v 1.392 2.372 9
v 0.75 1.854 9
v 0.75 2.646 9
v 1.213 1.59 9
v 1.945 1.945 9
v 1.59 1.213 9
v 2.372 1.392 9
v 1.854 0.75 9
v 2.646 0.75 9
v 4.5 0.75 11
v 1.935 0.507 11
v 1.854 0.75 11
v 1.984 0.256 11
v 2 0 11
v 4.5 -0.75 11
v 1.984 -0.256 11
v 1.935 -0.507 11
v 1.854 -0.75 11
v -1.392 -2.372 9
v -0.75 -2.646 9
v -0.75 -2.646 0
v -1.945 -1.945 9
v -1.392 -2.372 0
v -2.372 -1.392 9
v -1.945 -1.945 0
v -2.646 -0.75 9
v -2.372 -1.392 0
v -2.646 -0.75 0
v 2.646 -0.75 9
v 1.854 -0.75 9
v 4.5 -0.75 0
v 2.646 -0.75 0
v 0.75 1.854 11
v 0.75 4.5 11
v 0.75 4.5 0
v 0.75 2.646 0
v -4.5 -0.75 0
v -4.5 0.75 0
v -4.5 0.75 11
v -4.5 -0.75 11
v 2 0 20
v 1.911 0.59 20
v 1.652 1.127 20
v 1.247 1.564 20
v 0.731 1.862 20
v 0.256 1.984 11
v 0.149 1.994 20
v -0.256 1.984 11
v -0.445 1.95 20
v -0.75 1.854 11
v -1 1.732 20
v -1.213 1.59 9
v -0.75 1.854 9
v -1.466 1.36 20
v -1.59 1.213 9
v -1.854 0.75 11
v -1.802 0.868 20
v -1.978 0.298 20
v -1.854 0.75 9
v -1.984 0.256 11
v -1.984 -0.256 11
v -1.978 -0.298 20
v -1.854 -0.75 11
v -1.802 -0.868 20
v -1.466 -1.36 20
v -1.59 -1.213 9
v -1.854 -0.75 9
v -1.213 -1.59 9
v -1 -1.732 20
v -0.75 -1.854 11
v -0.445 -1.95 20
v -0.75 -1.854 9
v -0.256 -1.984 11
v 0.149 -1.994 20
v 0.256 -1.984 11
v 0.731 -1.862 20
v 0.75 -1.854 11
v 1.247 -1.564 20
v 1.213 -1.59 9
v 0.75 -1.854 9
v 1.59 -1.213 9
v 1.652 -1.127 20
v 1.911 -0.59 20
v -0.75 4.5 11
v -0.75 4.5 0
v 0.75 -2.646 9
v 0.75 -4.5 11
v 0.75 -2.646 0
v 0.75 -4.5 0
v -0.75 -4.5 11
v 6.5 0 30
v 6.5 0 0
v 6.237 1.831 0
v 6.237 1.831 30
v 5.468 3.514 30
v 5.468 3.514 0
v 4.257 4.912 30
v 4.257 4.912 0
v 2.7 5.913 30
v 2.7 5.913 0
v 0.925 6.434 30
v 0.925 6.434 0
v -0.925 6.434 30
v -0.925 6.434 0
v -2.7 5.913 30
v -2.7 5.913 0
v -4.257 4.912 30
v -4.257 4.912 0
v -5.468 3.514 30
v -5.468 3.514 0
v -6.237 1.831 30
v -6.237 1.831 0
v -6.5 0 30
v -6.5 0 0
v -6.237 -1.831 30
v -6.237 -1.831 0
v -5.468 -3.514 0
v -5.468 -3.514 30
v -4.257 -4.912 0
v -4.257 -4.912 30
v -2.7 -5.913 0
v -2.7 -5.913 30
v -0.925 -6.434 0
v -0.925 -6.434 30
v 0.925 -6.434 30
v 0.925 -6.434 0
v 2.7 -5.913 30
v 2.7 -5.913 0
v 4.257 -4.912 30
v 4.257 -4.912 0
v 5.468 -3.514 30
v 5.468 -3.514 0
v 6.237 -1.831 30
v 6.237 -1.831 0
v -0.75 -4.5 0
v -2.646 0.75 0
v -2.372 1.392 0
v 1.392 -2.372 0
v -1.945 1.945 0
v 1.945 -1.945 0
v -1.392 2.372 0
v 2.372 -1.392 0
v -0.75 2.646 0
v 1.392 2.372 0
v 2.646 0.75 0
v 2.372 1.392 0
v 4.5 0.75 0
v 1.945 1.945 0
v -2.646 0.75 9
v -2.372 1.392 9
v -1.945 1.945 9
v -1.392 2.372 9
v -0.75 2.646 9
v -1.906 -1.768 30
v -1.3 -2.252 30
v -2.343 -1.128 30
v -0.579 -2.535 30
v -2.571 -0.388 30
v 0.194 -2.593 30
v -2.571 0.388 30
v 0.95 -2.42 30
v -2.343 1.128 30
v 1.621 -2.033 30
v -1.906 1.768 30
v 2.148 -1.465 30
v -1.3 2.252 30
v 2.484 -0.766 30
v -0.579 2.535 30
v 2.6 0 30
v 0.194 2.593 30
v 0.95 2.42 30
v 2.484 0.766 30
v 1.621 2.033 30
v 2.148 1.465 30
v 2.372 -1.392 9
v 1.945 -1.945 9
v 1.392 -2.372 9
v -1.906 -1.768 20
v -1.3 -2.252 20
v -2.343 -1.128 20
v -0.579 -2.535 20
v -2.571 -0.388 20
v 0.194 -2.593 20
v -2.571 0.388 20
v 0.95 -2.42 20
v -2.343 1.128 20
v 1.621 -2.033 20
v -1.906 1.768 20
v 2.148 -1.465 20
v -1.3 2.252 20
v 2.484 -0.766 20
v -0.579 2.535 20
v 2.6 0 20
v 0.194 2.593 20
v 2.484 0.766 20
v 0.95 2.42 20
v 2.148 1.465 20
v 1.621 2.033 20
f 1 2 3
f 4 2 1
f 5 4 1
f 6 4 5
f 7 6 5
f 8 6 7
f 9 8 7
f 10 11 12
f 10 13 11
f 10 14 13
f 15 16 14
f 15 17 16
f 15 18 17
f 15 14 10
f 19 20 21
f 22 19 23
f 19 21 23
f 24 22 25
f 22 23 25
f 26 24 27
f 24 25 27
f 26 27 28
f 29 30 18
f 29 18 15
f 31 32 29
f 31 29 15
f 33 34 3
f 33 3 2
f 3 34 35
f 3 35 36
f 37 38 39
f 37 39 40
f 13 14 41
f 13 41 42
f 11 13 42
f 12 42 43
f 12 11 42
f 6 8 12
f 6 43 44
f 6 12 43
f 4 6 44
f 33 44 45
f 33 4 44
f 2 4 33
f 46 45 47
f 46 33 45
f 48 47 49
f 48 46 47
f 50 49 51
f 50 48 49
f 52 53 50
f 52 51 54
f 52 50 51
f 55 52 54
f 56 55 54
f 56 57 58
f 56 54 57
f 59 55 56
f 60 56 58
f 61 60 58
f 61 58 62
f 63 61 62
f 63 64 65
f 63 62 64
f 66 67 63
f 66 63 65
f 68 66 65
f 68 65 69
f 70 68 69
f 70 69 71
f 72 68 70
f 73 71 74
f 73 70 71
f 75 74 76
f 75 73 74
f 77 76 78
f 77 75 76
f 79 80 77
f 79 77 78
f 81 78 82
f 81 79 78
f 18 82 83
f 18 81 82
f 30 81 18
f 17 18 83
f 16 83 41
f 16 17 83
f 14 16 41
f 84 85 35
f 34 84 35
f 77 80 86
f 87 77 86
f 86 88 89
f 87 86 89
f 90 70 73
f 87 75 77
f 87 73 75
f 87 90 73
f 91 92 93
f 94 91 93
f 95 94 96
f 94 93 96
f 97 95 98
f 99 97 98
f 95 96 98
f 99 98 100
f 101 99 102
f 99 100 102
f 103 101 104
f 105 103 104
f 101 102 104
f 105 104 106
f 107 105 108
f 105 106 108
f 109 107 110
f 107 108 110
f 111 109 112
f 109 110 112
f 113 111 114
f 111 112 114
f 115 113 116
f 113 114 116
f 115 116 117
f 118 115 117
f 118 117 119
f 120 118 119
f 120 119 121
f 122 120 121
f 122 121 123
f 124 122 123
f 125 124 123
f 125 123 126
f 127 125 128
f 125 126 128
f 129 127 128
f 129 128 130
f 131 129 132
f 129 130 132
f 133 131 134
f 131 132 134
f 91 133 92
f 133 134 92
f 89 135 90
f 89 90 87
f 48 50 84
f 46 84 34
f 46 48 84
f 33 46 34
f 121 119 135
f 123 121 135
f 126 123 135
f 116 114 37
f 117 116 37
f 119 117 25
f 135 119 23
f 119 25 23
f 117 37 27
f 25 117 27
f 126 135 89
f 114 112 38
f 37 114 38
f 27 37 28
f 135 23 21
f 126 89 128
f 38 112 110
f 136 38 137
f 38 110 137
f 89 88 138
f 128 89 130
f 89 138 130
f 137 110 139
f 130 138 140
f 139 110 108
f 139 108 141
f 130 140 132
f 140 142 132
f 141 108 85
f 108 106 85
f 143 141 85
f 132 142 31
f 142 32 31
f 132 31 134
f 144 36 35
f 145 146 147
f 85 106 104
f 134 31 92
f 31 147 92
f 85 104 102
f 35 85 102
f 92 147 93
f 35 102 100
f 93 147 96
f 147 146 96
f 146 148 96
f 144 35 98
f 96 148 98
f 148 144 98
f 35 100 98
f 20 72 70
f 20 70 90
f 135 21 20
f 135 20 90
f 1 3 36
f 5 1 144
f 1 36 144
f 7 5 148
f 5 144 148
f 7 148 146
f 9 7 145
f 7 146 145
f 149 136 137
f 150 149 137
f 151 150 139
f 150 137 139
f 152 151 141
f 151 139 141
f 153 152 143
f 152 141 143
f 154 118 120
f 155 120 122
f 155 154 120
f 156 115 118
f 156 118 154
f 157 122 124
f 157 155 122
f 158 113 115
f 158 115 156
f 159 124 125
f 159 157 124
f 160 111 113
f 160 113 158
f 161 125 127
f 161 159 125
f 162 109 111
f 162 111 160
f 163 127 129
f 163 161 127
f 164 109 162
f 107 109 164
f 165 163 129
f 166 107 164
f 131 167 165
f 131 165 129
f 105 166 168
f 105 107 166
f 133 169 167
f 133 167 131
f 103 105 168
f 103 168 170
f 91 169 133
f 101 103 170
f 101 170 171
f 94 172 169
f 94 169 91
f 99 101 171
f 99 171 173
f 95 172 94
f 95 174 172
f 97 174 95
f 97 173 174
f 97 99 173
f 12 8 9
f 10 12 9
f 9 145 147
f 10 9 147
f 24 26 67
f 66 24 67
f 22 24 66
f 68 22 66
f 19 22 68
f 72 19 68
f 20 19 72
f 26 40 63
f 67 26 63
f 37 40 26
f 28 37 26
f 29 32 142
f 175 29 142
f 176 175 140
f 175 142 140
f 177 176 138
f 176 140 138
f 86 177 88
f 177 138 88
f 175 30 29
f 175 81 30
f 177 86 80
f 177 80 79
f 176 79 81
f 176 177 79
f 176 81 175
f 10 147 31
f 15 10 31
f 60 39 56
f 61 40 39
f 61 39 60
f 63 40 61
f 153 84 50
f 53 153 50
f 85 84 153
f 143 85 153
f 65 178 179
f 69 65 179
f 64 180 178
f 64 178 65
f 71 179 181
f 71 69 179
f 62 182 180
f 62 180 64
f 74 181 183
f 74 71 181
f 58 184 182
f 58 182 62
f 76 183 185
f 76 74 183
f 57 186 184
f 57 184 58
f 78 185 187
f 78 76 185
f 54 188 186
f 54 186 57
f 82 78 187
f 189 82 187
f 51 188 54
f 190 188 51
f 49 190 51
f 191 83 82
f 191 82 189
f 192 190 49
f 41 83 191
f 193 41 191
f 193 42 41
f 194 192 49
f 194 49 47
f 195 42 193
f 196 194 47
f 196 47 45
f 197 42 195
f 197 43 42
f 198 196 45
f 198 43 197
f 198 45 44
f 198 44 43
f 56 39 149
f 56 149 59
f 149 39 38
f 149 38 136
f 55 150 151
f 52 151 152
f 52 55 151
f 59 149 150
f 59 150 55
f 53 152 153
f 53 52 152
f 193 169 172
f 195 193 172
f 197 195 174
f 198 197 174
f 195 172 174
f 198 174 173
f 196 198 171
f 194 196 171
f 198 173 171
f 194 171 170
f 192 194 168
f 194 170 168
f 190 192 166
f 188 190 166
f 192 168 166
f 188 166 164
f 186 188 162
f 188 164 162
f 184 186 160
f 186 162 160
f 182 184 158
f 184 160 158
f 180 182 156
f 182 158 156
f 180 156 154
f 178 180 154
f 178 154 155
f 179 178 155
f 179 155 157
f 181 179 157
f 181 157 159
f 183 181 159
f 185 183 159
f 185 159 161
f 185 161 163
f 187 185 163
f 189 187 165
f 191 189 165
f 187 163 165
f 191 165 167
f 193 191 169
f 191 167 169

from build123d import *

# Parameters (mm, degrees)
SKETCH_R        = 6.5
SKETCH_R_2      = 2
PAD_DEPTH       = 30
SKETCH001_R     = 2.6
POCKET_DEPTH    = 10
SKETCH002_R     = 2.75
POCKET001_DEPTH = 9
SKETCH003_W     = 9
SKETCH003_H     = 1.5
SKETCH003_W_2   = 1.5
SKETCH003_H_2   = 9
POCKET002_DEPTH = 11


with BuildPart() as part:
    # Sketch → Pad (new body)
    with BuildSketch(Plane.XY):
        Circle(SKETCH_R)
        Circle(SKETCH_R_2, mode=Mode.SUBTRACT)
    extrude(amount=PAD_DEPTH)

    # Sketch001 → Pocket (cut)
    with BuildSketch(Plane.XY.offset(30)):
        Circle(SKETCH001_R)
    extrude(amount=-POCKET_DEPTH, mode=Mode.SUBTRACT)

    # Sketch002 → Pocket001 (cut)
    with BuildSketch(Plane(origin=(0, 0, 0), x_dir=(1, 0, 0), z_dir=(0, 0, -1))):
        Circle(SKETCH002_R)
    extrude(amount=-POCKET001_DEPTH, mode=Mode.SUBTRACT)

    # Sketch003 → Pocket002 (cut)
    with BuildSketch(Plane(origin=(0, 0, 0), x_dir=(1, 0, 0), z_dir=(0, 0, -1))):
        Rectangle(SKETCH003_W, SKETCH003_H)
        Rectangle(SKETCH003_W_2, SKETCH003_H_2)
    extrude(amount=-POCKET002_DEPTH, mode=Mode.SUBTRACT)


solid = part.part
